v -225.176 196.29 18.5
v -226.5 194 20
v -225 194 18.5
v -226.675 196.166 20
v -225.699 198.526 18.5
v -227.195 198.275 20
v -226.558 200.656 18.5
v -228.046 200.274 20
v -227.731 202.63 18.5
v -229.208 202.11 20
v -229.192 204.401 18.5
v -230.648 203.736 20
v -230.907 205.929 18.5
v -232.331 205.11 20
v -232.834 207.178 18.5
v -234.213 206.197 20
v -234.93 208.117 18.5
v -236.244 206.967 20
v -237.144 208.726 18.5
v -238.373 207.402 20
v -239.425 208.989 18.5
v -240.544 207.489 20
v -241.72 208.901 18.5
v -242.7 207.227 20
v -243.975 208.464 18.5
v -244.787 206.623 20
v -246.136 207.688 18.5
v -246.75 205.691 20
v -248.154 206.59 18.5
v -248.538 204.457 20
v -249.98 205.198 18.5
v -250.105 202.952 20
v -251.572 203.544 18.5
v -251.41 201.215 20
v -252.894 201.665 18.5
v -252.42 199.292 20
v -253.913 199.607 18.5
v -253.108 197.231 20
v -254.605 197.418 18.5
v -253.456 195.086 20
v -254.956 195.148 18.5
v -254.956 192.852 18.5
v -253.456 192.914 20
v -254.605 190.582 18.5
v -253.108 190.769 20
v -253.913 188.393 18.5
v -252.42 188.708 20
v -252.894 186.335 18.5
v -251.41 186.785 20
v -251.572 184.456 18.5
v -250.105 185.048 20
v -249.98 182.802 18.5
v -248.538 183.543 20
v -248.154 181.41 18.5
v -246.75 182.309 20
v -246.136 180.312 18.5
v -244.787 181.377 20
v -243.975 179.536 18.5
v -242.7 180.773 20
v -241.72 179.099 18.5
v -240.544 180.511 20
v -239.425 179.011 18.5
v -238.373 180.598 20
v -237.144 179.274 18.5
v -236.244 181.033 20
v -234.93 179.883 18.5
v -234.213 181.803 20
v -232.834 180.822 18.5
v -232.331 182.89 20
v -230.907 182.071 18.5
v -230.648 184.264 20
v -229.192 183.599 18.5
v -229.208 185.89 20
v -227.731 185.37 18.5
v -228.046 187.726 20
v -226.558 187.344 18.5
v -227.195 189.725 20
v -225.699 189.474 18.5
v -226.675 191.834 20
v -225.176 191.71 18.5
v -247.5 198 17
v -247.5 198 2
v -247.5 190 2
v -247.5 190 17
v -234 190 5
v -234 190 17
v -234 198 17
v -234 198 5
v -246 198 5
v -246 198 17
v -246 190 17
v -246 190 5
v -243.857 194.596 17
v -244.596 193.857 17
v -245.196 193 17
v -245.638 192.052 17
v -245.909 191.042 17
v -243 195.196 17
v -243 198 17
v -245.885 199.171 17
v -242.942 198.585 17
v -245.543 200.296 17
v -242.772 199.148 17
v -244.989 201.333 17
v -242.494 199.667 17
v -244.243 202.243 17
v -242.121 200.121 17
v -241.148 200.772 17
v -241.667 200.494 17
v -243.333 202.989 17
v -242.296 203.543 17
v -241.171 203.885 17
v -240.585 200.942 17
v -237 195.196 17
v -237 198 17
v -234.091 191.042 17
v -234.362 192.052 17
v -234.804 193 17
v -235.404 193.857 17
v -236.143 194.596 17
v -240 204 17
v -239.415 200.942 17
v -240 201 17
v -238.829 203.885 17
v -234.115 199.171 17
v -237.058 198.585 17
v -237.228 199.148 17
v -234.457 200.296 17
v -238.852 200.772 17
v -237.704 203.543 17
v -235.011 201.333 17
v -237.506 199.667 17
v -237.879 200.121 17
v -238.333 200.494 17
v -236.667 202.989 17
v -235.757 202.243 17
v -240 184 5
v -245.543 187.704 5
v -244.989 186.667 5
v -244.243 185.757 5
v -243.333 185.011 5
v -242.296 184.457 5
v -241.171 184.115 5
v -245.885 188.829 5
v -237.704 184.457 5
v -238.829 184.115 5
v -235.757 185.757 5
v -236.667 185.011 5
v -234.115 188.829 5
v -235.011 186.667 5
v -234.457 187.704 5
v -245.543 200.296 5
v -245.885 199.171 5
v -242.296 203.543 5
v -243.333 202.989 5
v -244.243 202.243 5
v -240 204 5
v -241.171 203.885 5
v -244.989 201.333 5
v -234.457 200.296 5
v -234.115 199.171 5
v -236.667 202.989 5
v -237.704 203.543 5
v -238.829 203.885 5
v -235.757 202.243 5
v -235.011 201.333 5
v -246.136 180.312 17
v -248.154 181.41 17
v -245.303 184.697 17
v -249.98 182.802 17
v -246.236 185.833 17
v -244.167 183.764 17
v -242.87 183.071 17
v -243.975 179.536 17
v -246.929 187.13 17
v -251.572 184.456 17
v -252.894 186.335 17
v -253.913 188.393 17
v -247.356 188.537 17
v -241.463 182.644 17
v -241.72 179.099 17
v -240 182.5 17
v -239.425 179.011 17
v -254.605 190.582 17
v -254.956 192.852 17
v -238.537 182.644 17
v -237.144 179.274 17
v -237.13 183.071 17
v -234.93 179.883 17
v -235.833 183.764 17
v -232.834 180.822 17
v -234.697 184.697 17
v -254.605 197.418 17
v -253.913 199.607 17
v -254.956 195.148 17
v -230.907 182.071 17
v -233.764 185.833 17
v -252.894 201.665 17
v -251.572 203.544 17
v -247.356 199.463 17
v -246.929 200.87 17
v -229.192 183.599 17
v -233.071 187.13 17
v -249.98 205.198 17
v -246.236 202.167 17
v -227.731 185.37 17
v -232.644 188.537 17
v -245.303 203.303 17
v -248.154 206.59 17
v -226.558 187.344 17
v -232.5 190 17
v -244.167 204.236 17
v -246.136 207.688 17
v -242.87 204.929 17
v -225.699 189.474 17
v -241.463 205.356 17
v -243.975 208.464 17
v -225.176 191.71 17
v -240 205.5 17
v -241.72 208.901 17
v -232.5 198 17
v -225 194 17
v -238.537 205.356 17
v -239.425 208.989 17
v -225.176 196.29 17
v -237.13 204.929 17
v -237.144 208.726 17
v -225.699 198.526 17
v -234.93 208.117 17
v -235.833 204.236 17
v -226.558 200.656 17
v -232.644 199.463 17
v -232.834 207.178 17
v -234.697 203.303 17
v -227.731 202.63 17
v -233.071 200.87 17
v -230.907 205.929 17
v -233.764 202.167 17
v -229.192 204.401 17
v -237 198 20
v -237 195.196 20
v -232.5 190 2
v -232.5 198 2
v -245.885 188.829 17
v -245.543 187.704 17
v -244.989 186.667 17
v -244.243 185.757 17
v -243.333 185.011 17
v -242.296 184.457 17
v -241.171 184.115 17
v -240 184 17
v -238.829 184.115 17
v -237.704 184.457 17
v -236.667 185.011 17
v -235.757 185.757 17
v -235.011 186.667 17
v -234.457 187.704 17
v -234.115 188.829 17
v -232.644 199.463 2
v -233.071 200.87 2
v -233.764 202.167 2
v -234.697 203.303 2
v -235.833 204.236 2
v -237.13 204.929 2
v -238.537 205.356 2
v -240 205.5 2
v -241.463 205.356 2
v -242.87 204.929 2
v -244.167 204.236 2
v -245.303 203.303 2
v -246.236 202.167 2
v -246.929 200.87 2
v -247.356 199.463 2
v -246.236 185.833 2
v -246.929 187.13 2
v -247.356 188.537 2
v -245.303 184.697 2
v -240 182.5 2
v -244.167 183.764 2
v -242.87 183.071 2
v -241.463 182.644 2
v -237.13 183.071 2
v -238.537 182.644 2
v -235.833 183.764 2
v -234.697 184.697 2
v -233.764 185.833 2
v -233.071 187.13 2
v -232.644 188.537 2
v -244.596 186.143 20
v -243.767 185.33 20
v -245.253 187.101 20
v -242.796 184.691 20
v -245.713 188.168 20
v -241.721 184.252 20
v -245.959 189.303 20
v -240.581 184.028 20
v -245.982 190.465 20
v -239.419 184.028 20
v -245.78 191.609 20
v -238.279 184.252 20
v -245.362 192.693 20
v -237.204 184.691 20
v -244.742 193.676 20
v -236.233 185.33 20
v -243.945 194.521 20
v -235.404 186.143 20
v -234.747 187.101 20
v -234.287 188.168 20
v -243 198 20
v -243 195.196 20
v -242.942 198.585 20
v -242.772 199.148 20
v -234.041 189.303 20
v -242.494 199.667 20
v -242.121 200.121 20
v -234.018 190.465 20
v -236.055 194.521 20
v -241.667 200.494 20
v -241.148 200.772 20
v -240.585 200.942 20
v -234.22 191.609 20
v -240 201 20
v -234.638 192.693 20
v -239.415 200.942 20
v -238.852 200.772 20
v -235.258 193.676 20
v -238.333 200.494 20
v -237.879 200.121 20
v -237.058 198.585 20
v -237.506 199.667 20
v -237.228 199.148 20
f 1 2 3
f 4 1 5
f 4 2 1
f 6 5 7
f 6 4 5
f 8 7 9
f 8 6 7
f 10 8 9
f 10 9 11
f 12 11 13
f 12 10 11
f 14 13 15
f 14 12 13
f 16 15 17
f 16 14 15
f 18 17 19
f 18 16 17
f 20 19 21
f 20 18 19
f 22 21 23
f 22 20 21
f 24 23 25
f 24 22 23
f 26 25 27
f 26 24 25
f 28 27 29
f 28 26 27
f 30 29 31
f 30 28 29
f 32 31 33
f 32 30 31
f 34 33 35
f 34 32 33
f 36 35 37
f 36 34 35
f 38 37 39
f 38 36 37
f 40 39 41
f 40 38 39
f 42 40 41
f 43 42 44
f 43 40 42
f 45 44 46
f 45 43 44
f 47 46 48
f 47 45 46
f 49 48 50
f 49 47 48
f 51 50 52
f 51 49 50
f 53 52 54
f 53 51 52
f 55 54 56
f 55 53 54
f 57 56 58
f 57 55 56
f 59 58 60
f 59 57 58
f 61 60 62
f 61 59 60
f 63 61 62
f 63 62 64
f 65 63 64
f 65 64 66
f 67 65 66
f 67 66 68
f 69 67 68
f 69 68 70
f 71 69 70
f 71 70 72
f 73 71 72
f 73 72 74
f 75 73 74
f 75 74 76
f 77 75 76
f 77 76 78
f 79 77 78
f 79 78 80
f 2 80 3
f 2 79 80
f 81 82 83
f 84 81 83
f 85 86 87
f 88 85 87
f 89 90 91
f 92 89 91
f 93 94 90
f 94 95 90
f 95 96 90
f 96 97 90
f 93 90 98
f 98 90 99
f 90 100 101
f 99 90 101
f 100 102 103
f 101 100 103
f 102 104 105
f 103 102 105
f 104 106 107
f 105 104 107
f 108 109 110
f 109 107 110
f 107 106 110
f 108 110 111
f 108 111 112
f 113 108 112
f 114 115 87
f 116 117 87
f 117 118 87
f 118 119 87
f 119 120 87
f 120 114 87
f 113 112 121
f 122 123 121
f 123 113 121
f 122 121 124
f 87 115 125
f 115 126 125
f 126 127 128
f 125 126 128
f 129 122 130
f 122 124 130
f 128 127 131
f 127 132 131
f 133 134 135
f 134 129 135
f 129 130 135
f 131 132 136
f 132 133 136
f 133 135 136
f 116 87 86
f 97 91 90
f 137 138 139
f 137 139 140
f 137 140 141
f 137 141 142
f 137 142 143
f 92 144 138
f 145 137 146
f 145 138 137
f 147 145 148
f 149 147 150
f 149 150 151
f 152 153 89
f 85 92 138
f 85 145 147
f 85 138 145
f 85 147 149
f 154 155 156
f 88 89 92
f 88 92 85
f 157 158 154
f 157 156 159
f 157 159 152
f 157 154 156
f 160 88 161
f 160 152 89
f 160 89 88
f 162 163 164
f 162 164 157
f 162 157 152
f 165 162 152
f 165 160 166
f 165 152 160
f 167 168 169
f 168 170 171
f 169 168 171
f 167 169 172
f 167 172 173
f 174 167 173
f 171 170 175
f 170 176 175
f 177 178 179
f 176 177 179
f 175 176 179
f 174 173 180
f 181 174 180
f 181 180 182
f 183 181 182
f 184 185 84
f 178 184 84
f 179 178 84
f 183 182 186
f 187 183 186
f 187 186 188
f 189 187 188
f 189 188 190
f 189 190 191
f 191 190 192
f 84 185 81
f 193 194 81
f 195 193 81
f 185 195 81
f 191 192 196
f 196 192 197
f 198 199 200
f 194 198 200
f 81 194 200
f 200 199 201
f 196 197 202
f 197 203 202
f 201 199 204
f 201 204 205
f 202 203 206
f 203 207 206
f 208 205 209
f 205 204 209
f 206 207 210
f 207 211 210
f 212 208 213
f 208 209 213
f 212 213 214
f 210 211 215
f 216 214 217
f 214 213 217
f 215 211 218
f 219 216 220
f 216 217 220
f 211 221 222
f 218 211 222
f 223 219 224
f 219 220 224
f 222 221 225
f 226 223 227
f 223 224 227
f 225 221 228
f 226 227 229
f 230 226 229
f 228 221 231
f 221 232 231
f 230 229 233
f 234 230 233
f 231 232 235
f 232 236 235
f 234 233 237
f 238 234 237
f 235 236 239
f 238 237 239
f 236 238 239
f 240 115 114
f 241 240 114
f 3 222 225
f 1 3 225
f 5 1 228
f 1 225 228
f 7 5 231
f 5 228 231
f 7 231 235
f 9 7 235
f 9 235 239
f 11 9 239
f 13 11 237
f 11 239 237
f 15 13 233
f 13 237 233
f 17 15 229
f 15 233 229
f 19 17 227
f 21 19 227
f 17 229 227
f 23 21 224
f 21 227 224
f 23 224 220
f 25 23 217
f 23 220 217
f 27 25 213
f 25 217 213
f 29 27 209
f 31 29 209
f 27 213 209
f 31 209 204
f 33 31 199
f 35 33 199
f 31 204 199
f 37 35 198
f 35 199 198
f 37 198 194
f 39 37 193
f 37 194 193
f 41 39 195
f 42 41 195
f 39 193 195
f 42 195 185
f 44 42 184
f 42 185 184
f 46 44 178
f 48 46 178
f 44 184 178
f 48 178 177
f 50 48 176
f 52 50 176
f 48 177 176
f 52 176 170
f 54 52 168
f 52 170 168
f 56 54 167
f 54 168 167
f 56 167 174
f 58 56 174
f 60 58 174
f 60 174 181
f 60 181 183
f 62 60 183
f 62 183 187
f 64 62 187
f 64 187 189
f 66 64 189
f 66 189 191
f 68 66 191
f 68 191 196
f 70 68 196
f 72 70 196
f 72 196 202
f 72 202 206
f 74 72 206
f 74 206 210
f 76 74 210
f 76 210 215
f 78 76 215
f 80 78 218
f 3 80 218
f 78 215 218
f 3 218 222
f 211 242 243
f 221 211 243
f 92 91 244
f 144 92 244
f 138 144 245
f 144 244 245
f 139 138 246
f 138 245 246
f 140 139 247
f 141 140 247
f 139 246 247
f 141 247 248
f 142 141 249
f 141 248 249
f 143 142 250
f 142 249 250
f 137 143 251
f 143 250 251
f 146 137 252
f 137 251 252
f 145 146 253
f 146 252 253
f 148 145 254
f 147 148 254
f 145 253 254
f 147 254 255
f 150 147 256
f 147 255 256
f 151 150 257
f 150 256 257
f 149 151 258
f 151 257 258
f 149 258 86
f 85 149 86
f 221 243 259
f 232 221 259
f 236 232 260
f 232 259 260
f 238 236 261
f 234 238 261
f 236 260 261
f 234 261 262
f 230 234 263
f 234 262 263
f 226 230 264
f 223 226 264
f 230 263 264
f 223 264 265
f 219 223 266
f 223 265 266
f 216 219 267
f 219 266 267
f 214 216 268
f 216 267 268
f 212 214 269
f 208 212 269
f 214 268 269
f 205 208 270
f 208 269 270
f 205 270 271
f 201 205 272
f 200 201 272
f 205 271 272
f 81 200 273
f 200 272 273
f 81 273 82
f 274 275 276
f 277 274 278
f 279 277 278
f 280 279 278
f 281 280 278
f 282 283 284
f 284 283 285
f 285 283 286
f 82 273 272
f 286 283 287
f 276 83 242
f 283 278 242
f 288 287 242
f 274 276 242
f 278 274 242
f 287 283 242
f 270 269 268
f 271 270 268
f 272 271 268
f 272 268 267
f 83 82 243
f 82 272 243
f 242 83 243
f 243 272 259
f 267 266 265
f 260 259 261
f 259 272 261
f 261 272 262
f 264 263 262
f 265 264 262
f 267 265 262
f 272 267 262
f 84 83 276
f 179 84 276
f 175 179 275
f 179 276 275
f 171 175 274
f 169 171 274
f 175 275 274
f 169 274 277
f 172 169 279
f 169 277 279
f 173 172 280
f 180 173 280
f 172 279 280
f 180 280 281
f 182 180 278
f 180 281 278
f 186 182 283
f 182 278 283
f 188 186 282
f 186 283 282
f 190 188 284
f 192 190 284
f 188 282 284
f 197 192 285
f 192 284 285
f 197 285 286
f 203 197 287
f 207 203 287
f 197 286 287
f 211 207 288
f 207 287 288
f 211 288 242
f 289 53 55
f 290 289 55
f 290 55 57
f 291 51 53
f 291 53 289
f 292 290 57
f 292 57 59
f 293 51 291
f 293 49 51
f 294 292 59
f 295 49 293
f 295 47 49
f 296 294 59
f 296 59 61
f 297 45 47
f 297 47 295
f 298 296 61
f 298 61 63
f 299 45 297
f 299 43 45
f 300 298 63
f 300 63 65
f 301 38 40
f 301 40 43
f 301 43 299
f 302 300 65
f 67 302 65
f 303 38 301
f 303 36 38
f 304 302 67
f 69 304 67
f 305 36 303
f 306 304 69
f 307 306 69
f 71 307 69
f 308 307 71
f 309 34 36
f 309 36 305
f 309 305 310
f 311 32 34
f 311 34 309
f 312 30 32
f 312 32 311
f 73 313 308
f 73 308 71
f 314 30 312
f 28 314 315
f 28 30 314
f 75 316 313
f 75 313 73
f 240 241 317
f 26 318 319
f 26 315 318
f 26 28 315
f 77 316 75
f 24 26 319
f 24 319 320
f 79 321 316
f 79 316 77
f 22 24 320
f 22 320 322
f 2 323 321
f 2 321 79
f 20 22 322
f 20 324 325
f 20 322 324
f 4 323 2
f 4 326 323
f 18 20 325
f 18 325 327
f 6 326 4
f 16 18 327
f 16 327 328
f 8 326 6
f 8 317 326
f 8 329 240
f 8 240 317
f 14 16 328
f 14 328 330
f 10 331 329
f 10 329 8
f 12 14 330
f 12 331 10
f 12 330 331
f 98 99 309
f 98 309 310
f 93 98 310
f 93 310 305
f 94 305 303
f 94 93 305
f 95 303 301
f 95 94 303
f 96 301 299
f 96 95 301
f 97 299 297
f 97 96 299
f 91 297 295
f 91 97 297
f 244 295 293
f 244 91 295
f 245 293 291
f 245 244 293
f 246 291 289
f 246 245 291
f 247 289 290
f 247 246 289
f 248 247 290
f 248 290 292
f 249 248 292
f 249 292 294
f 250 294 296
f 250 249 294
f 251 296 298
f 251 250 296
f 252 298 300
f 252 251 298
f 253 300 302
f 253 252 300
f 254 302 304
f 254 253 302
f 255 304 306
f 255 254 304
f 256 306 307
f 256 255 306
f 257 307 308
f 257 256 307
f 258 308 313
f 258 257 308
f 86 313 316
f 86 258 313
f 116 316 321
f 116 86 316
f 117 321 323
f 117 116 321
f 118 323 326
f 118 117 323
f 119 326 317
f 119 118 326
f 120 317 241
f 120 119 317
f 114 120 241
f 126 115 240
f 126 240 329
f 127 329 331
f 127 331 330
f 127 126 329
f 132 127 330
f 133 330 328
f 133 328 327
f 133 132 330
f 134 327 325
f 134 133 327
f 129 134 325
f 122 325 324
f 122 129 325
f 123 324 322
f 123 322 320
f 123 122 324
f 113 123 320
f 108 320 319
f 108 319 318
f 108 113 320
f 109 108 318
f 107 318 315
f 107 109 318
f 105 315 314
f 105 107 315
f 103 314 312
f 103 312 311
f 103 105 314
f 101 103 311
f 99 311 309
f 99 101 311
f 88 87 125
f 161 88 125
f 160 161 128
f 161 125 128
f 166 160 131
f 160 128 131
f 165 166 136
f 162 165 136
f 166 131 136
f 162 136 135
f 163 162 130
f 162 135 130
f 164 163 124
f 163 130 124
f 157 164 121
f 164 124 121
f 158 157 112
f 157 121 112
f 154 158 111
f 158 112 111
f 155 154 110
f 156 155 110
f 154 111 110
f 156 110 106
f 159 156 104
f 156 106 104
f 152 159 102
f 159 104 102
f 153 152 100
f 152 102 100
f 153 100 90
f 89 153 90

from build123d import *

# Parameters (mm, degrees)
PAD011_DEPTH    = 15
POCKET021_DEPTH = 12
SKETCH036_R     = 15
PAD012_DEPTH    = 3
CHAMFER001_SIZE = 1.5


with BuildPart() as part:
    # Sketch034 → Pad011 (new body)
    with BuildSketch(Plane.XY):
        with BuildLine():
            ThreePointArc((7.5, 8), (0, 15.5), (-7.5, 8))
            Line((-7.5, 8), (-7.5, 0))
            ThreePointArc((-7.5, 0), (0, -7.5), (7.5, 0))
            Line((7.5, 0), (7.5, 8))
        make_face()
    extrude(amount=PAD011_DEPTH)

    # Sketch035 (on Face6 of Pad011) → Pocket021 (cut)
    with BuildSketch(Plane.XY.offset(15)):
        with BuildLine():
            ThreePointArc((-6, 0), (0, -6), (6, 0))
            Line((6, 0), (6, 8))
            ThreePointArc((6, 8), (0, 14), (-6, 8))
            Line((-6, 8), (-6, 0))
        make_face()
    extrude(amount=-POCKET021_DEPTH, mode=Mode.SUBTRACT)

    # Sketch036 (on Face5 of Pocket021) → Pad012 (join)
    with BuildSketch(Plane.XY.offset(15)):
        with Locations((0, 4)):
            Circle(SKETCH036_R)
        with BuildLine():
            ThreePointArc((-3, 5.196152), (0, -6), (3, 5.196152))
            Line((3, 8), (3, 5.196152))
            ThreePointArc((3, 8), (0, 11), (-3, 8))
            Line((-3, 8), (-3, 5.196152))
        make_face(mode=Mode.SUBTRACT)
    extrude(amount=PAD012_DEPTH)

    # Chamfer001
    chamfer001_edges = [part.edges().sort_by_distance(p)[0] for p in [
        (-15, 4, 18),
    ]]
    chamfer(chamfer001_edges, length=CHAMFER001_SIZE)


with BuildPart() as part_1:
    # Body004 placement: moved
    add(part.part.moved(Location((-240, 190, 2))))


solid = part_1.part
